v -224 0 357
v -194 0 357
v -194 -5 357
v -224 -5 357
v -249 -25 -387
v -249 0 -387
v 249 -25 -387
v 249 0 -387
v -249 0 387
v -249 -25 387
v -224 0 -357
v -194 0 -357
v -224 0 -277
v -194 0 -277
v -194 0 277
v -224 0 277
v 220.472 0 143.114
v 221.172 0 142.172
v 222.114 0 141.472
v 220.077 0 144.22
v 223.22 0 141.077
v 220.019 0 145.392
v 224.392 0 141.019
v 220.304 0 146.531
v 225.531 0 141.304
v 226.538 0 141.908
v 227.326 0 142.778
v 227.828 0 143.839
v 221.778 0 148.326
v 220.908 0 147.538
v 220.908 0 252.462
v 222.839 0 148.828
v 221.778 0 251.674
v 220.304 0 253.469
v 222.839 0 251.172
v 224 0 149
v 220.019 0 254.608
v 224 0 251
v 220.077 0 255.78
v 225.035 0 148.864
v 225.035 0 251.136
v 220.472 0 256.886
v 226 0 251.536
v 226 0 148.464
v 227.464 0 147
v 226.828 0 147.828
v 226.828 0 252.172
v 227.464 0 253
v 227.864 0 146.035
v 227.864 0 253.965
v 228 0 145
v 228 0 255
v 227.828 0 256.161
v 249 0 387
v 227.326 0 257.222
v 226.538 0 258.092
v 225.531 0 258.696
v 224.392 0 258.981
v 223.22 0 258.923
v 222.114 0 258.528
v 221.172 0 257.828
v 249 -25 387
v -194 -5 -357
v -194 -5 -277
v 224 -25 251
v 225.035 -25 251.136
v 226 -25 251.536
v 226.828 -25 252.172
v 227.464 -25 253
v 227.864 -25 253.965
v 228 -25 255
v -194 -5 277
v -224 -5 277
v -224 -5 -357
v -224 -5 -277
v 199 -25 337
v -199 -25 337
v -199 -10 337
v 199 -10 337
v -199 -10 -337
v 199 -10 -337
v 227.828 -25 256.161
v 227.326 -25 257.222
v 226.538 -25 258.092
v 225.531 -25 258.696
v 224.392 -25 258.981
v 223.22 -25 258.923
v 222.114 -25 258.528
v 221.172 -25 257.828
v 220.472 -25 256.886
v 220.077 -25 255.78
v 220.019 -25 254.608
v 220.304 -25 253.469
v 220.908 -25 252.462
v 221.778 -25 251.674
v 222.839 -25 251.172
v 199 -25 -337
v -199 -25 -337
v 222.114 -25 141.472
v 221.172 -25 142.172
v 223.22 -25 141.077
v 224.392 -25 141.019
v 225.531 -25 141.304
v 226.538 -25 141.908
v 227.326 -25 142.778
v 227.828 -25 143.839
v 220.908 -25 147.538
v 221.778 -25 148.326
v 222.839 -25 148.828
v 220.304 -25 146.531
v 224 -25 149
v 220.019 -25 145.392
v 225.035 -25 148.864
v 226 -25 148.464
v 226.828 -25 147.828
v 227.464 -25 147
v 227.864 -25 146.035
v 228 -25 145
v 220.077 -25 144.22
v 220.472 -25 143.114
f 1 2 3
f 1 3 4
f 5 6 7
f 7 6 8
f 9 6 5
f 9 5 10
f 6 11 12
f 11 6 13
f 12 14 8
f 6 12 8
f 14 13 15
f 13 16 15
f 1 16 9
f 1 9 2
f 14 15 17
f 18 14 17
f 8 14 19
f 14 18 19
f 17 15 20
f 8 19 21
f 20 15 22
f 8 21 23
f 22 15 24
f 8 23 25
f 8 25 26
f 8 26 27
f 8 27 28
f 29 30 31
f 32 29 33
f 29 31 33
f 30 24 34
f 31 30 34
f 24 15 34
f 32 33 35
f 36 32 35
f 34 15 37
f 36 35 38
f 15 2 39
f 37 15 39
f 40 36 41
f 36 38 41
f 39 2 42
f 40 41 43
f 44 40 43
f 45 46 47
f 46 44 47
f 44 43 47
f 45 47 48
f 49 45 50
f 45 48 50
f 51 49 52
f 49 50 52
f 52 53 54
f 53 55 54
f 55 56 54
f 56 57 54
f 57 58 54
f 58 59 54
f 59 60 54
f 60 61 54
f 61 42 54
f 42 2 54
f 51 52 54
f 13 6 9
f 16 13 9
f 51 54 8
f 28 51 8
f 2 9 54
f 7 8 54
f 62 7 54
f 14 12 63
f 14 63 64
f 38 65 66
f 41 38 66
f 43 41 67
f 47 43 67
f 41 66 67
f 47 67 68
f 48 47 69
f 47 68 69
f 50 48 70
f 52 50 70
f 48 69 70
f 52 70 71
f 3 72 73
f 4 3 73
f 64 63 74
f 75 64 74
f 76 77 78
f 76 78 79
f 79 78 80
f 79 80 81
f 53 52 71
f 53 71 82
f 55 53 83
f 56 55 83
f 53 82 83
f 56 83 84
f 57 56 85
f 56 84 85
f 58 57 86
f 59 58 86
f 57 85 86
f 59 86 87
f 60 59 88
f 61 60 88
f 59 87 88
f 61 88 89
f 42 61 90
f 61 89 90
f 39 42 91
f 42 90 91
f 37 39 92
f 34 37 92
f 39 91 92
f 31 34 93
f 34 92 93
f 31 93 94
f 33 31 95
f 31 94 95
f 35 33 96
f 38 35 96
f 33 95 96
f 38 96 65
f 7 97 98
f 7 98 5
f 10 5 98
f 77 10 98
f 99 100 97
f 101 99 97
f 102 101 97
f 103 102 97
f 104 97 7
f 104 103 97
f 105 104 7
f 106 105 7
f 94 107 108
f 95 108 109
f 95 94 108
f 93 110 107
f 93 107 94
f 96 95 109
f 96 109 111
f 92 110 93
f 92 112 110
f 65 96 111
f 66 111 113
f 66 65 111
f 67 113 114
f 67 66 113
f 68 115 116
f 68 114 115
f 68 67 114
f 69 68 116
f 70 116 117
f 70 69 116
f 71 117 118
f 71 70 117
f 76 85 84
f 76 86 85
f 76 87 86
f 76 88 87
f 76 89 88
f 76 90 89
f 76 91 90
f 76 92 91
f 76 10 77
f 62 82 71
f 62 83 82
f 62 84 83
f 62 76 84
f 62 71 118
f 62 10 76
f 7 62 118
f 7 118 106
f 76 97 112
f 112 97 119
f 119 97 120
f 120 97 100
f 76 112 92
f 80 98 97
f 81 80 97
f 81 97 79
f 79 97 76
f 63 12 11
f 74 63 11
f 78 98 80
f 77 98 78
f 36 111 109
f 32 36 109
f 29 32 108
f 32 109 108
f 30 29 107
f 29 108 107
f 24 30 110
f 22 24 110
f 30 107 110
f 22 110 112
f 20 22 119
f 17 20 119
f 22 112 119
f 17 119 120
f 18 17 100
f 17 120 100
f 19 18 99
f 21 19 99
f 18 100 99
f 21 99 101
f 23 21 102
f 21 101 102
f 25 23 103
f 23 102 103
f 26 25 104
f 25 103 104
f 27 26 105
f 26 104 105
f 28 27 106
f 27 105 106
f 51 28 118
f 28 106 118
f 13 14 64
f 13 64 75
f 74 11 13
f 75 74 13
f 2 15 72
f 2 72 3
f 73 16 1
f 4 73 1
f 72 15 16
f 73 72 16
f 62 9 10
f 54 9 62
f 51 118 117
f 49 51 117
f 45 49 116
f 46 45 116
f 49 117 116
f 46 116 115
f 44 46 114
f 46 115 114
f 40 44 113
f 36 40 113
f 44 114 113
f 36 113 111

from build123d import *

# Parameters (mm, degrees)
F0_W     = 498
F0_H     = 774
F1_DEPTH = 25
F2_W     = 398
F2_H     = 674
F3_DEPTH = 15
F5_DEPTH = 25
F6_W     = 30
F6_H     = 80
F7_DEPTH = 5


with BuildPart() as f1:
    # F0 (on Front) → F1 (new body)
    with BuildSketch(Plane.XZ):
        Rectangle(F0_W, F0_H)
    extrude(amount=F1_DEPTH)

    # F2 (on face) → F3 (cut)
    with BuildSketch(Plane.XZ.offset(25)):
        Rectangle(F2_W, F2_H)
    extrude(amount=-F3_DEPTH, mode=Mode.SUBTRACT)

    # F4 (on face) → F5 (cut, through all)
    with BuildSketch(Plane.XZ.offset(25)):
        with BuildLine():
            ThreePointArc((228, 255), (221.171573, 257.828427), (224, 251))
            ThreePointArc((224, 251), (226.828427, 252.171573), (228, 255))
        make_face()
        with BuildLine():
            ThreePointArc((228, 145), (226.828427, 147.828427), (224, 149))
            ThreePointArc((224, 149), (221.171573, 142.171573), (228, 145))
        make_face()
    extrude(amount=-F5_DEPTH, mode=Mode.SUBTRACT)

    # F6 (on face) → F7 (cut)
    with BuildSketch(Plane(origin=(0, 0, 0), x_dir=(-1, 0, 0), z_dir=(0, 1, 0))):
        with Locations((209, 317)):
            Rectangle(F6_W, F6_H)
        with Locations((209, -317)):
            Rectangle(F6_W, F6_H)
    extrude(amount=-F7_DEPTH, mode=Mode.SUBTRACT)


solid = f1.part
